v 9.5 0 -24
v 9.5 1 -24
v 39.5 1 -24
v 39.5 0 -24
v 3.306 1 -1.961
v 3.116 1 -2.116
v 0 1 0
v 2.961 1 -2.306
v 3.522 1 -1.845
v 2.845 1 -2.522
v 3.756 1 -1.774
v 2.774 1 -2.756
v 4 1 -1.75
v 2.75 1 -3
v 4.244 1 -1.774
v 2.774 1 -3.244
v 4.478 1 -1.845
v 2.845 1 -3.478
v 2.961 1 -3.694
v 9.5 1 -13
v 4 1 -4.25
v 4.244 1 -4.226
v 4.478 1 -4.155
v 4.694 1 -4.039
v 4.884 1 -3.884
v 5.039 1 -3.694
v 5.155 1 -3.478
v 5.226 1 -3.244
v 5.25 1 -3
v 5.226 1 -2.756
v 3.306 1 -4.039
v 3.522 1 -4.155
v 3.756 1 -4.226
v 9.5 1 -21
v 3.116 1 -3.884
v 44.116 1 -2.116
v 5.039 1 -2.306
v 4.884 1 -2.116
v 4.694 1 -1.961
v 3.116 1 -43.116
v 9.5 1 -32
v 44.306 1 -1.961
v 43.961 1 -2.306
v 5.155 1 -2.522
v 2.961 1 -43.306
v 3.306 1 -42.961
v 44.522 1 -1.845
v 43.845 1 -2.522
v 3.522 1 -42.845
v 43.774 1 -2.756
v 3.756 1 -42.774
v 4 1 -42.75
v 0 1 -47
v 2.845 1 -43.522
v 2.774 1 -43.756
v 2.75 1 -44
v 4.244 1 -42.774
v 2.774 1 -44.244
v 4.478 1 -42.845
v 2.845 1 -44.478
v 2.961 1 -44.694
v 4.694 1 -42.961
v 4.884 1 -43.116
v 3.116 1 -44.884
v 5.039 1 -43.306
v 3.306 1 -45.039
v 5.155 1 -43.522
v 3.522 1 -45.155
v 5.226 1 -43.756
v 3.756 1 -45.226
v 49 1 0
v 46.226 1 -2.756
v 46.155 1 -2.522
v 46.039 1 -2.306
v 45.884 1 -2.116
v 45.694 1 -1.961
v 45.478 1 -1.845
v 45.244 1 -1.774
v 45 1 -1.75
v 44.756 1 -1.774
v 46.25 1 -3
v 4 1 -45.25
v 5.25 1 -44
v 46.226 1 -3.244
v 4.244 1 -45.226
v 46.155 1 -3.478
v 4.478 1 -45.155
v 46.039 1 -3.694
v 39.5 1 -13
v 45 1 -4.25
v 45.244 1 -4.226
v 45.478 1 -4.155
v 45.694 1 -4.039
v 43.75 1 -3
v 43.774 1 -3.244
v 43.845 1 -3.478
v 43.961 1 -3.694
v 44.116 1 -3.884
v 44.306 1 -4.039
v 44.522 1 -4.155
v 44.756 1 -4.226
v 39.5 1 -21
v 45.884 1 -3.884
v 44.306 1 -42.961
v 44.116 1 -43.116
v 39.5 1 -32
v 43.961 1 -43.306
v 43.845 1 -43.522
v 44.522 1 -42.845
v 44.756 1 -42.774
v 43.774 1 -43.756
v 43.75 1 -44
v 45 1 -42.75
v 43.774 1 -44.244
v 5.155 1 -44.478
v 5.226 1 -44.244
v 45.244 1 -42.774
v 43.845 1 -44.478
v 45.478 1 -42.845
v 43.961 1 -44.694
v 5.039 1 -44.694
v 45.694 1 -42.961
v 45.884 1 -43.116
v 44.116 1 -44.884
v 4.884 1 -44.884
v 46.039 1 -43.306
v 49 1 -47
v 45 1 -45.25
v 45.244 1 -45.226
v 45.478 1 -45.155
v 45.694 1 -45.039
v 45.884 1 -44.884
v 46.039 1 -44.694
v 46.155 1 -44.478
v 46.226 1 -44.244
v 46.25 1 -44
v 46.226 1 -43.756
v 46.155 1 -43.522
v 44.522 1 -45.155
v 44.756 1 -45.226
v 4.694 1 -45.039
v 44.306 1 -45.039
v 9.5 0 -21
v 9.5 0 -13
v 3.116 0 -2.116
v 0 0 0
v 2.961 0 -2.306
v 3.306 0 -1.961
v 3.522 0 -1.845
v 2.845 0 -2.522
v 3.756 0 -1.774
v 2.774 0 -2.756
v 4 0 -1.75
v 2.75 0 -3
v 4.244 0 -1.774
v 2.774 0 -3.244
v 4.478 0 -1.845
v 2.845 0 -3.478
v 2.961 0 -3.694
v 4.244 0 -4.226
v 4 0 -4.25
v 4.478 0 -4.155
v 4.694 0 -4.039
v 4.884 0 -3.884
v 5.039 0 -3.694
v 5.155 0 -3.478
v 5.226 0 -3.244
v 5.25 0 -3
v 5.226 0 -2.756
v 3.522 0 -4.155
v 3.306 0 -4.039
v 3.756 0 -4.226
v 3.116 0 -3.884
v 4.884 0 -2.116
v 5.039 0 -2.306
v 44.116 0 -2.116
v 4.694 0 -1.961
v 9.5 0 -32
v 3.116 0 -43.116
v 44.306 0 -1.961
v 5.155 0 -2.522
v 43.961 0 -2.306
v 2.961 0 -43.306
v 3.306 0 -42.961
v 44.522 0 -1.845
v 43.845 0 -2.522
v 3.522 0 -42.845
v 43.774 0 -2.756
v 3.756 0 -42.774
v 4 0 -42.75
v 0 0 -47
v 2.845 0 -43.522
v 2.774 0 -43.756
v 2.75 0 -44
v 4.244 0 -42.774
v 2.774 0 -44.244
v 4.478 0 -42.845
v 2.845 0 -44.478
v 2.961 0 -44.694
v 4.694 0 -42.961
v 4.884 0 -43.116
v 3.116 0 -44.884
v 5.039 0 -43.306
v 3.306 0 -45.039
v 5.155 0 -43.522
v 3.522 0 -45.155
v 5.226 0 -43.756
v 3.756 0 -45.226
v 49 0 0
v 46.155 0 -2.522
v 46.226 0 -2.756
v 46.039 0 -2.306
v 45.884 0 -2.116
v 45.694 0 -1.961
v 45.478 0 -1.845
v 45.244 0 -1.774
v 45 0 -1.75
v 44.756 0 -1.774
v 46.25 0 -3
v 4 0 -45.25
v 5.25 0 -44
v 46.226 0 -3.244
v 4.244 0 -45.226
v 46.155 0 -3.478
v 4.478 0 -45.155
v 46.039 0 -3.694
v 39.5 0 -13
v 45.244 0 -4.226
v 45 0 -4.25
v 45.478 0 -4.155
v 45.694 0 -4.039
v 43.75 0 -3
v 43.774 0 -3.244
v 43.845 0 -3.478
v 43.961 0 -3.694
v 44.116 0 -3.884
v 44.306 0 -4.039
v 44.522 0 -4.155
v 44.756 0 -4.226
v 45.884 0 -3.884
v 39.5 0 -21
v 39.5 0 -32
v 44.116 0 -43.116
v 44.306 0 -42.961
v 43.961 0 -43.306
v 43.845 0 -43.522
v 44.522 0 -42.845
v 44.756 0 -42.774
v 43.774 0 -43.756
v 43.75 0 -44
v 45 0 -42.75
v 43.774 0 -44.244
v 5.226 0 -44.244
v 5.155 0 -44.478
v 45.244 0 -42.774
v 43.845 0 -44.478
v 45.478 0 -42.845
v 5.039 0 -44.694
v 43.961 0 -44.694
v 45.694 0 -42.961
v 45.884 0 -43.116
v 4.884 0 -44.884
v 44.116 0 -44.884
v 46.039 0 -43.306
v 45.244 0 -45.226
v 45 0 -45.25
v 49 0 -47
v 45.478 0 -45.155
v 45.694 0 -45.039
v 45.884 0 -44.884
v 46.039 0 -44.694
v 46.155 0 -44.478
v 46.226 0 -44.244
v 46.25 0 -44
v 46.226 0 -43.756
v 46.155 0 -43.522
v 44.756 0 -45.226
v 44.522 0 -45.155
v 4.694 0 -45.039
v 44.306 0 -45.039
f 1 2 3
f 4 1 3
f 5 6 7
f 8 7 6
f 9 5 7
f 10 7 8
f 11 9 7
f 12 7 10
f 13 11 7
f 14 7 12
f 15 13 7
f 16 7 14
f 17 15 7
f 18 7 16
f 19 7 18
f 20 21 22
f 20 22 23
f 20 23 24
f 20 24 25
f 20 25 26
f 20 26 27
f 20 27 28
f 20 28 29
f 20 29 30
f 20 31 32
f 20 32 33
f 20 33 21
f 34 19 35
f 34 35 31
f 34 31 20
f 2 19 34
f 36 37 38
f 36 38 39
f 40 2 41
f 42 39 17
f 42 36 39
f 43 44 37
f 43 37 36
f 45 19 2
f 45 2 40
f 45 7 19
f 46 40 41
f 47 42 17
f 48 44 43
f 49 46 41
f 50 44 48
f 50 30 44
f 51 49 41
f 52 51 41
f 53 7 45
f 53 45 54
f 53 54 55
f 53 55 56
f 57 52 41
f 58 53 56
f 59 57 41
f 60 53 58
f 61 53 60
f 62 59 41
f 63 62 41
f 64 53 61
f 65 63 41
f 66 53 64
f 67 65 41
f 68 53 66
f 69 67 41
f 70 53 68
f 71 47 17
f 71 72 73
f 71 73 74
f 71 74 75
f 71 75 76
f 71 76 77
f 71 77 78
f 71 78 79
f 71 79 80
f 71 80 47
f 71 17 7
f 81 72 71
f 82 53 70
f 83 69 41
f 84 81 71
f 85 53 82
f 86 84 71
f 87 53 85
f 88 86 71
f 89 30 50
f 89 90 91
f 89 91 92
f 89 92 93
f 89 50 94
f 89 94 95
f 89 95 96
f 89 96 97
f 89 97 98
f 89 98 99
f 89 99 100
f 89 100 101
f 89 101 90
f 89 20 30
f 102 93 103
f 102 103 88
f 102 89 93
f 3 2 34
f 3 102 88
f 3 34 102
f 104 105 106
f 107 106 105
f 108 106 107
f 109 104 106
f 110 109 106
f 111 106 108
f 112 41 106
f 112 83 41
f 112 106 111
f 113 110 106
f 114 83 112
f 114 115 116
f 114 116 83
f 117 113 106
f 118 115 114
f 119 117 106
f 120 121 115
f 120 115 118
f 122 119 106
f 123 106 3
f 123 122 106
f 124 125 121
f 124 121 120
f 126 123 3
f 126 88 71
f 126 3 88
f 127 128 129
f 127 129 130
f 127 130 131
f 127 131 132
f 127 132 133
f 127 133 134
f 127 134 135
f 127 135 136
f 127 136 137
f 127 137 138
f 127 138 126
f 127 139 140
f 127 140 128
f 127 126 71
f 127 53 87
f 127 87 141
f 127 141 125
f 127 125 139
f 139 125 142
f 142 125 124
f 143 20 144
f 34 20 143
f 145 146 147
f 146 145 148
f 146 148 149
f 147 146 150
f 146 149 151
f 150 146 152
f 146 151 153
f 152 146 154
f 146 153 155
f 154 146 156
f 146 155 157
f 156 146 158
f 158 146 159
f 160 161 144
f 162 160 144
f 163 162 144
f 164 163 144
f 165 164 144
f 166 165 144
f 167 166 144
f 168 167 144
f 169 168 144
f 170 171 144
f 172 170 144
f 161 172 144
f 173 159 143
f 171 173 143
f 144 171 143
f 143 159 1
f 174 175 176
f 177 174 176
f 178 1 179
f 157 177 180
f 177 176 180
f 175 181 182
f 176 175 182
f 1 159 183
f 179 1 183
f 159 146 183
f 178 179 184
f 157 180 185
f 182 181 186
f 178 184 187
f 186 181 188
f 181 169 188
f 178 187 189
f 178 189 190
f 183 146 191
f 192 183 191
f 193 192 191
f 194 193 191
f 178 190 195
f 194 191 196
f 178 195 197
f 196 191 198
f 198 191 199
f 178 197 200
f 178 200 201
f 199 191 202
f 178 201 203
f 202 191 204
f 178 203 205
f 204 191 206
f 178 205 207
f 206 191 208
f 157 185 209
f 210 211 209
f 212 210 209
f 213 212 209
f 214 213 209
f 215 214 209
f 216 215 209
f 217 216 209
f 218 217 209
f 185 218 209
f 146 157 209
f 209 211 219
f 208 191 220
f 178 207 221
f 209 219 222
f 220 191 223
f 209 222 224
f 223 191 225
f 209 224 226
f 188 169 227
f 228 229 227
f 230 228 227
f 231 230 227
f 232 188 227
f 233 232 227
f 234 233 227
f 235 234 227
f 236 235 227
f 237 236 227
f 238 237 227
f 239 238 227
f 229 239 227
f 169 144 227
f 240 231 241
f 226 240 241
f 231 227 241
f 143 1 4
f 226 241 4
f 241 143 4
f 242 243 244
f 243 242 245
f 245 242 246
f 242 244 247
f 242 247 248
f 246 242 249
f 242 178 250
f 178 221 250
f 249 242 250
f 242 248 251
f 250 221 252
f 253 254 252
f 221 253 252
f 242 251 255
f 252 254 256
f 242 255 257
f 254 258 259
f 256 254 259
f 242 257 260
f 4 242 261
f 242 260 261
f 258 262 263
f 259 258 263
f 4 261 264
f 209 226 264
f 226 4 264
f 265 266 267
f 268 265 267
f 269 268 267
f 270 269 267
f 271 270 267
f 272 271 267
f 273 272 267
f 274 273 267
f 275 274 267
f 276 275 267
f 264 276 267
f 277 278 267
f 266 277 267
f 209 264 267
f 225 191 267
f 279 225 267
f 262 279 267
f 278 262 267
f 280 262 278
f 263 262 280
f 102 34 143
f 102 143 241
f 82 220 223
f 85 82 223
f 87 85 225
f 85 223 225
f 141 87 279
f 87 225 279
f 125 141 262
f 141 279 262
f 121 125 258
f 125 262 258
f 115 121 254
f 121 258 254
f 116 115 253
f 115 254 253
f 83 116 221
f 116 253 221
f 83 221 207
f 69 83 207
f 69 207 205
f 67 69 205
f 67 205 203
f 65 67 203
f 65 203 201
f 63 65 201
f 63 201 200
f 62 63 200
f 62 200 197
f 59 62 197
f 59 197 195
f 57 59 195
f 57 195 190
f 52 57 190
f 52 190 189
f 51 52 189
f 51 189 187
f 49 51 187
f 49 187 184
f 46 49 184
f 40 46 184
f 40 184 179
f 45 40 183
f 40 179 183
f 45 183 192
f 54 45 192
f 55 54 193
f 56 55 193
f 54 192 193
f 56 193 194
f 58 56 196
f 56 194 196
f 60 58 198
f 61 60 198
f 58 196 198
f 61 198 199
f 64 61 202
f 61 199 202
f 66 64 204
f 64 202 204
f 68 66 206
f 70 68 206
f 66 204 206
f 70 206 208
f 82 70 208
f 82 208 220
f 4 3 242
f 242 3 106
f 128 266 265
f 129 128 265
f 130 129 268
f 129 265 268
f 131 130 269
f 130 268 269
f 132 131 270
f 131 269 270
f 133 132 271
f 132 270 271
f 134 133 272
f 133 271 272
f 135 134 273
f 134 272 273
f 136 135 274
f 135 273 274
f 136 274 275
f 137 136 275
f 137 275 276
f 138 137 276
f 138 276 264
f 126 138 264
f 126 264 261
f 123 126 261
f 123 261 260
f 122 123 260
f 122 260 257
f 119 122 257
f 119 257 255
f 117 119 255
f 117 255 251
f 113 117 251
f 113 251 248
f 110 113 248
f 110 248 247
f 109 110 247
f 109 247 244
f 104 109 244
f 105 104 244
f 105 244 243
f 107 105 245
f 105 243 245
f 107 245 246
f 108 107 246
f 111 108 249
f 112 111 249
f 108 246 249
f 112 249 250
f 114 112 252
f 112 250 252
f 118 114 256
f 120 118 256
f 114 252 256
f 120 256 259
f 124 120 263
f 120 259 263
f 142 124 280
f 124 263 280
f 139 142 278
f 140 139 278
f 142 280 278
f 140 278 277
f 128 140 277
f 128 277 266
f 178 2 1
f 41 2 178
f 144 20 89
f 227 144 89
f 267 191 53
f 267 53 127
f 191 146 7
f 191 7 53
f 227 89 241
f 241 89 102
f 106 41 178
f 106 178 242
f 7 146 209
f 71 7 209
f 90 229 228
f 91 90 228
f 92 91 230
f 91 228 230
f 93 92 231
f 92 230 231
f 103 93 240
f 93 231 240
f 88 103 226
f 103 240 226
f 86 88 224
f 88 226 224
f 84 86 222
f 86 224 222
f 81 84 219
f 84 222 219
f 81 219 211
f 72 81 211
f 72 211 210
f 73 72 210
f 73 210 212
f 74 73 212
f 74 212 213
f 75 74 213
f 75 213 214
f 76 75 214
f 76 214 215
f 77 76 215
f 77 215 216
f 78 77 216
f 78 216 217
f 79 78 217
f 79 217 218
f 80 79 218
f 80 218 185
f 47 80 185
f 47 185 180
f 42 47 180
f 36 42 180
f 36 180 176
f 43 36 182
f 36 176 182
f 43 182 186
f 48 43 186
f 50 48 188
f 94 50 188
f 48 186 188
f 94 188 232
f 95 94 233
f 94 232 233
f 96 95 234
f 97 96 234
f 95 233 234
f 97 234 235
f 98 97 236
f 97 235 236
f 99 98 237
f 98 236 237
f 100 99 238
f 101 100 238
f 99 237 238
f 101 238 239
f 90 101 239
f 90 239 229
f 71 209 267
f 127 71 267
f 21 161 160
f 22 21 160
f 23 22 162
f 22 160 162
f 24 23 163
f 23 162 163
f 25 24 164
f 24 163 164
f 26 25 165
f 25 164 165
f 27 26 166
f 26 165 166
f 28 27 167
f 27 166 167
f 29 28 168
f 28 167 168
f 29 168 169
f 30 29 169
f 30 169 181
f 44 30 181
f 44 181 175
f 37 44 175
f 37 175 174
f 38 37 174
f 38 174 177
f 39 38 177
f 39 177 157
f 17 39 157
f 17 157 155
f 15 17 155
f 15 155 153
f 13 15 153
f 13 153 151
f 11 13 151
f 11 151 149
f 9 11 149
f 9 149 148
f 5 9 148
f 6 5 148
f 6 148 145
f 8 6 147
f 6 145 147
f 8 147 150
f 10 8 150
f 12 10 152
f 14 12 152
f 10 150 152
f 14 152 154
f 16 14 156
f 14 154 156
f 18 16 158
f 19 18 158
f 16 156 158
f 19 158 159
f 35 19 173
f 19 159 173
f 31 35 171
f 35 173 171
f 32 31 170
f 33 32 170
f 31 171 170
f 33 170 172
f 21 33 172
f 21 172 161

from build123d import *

# Parameters (mm, degrees)
CROQUIS1_W                                 = 49
CROQUIS1_H                                 = 47
SALIENTE_EXTRUIR1_DEPTH                    = 1
PERFORADOR_PARA_ROSCAR_PARA_MACHO_DE_ROS_D = 2.5
CORTAR_EXTRUIR1_REACH                      = 69.904
CROQUIS5_W                                 = 30
CROQUIS5_H                                 = 8


with BuildPart() as part:
    # Croquis1 → Saliente-Extruir1 (new body)
    with BuildSketch(Plane(origin=(0, 0, 0), x_dir=(1, 0, 0), z_dir=(0, 1, 0))):
        with Locations((24.5, 23.5)):
            Rectangle(CROQUIS1_W, CROQUIS1_H)
    extrude(amount=SALIENTE_EXTRUIR1_DEPTH)

    # Perforador para roscar para macho de roscar para M31 (through all)
    with Locations(Plane(origin=(4, 1, -44), x_dir=(0, 0, 1), z_dir=(0, 1, 0))):
        with Locations((0, 0), (41, 0), (41, 41), (0, 41)):
            Hole(PERFORADOR_PARA_ROSCAR_PARA_MACHO_DE_ROS_D / 2)

    # Croquis5 → Cortar-Extruir1 (cut, up to next)
    with BuildSketch(Plane(origin=(0, 1, 0), x_dir=(1, 0, 0), z_dir=(0, 1, 0)), mode=Mode.PRIVATE) as cortar_extruir1_sk1:
        with Locations((24.5, 17)):
            Rectangle(CROQUIS5_W, CROQUIS5_H)
    cortar_extruir1_tool1 = extrude(cortar_extruir1_sk1.sketch, amount=-CORTAR_EXTRUIR1_REACH, mode=Mode.PRIVATE) & part.part
    # Croquis5 → Cortar-Extruir1 (cut, up to next)
    with BuildSketch(Plane(origin=(0, 1, 0), x_dir=(1, 0, 0), z_dir=(0, 1, 0)), mode=Mode.PRIVATE) as cortar_extruir1_sk2:
        with Locations((24.5, 28)):
            Rectangle(CROQUIS5_W, CROQUIS5_H)
    cortar_extruir1_tool2 = extrude(cortar_extruir1_sk2.sketch, amount=-CORTAR_EXTRUIR1_REACH, mode=Mode.PRIVATE) & part.part
    add(cortar_extruir1_tool1.solids().sort_by_distance((24.5, 1, -17))[0], mode=Mode.SUBTRACT)
    add(cortar_extruir1_tool2.solids().sort_by_distance((24.5, 1, -28))[0], mode=Mode.SUBTRACT)


solid = part.part
